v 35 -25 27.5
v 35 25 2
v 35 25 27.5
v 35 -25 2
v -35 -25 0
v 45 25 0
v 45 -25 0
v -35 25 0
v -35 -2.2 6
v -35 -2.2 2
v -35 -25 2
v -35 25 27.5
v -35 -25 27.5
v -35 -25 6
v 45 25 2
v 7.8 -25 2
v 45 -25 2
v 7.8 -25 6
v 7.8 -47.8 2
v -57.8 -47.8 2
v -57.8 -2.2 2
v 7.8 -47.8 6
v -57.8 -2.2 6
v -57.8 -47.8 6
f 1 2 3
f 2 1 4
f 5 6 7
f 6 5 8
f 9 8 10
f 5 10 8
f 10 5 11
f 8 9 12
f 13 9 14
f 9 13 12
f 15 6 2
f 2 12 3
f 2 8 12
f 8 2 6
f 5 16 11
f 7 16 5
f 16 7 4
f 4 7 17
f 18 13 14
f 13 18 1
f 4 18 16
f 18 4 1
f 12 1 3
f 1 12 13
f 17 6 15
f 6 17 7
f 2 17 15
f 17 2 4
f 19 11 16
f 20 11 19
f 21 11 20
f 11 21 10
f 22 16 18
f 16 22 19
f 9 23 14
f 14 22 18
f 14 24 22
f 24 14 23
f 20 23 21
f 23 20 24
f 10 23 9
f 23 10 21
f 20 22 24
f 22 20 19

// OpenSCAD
// Two-part enclosure for a small electronics board (e.g. Arduino-based temperature logger)
// Print orientation: box stands on the bed, lid lies flat on the bed with its lip facing up.
// The two parts are placed side by side with a 10 mm gap so they print together.

$fn = 64;

// ---------------- Dimensions (mm) ----------------
box_x      = 70;    // box outer length (X)
box_y      = 50;    // box outer width (Y)
box_z      = 30;    // box outer height (Z)
wall       = 2;     // box wall thickness
floor      = 2;     // box floor thickness (included in wall)

lip_t      = 1.5;   // lid wall thickness
lip_h      = 4;     // lid lip height above the plate
lip_x      = 65.6;  // lid outer length (X), 4.4 mm clearance inside the box
lip_y      = 45.6;  // lid outer width (Y), 4.4 mm clearance inside the box

plate_x    = box_x; // plate length (same as box)
plate_y    = box_y; // plate width (same as box)
plate_t    = 2;     // plate thickness

gap        = 10;    // gap between box and lid along X
eps        = 0.5;   // cutter overshoot

// ---------------- Model ----------------
union() {
    // Part 1: Box (open top)
    translate([-box_x/2, -box_y/2, 0])
        difference() {
            cube([box_x, box_y, box_z - floor]);
            translate([0, 0, box_z - floor - eps])
                cube([box_x + 2*eps, box_y + 2*eps, floor + eps]);
        }

    // Part 2: Lid (plate with a centred lip, printed upside down)
    translate([-box_x/2 + gap, -box_y/2, 0])
        union() {
            // Base plate
            cube([plate_x, plate_y, plate_t]);
            // Lip on top of the plate
            translate([-lip_x/2, -lip_y/2, plate_t])
                cube([lip_x, lip_y, lip_h]);
        }
}
